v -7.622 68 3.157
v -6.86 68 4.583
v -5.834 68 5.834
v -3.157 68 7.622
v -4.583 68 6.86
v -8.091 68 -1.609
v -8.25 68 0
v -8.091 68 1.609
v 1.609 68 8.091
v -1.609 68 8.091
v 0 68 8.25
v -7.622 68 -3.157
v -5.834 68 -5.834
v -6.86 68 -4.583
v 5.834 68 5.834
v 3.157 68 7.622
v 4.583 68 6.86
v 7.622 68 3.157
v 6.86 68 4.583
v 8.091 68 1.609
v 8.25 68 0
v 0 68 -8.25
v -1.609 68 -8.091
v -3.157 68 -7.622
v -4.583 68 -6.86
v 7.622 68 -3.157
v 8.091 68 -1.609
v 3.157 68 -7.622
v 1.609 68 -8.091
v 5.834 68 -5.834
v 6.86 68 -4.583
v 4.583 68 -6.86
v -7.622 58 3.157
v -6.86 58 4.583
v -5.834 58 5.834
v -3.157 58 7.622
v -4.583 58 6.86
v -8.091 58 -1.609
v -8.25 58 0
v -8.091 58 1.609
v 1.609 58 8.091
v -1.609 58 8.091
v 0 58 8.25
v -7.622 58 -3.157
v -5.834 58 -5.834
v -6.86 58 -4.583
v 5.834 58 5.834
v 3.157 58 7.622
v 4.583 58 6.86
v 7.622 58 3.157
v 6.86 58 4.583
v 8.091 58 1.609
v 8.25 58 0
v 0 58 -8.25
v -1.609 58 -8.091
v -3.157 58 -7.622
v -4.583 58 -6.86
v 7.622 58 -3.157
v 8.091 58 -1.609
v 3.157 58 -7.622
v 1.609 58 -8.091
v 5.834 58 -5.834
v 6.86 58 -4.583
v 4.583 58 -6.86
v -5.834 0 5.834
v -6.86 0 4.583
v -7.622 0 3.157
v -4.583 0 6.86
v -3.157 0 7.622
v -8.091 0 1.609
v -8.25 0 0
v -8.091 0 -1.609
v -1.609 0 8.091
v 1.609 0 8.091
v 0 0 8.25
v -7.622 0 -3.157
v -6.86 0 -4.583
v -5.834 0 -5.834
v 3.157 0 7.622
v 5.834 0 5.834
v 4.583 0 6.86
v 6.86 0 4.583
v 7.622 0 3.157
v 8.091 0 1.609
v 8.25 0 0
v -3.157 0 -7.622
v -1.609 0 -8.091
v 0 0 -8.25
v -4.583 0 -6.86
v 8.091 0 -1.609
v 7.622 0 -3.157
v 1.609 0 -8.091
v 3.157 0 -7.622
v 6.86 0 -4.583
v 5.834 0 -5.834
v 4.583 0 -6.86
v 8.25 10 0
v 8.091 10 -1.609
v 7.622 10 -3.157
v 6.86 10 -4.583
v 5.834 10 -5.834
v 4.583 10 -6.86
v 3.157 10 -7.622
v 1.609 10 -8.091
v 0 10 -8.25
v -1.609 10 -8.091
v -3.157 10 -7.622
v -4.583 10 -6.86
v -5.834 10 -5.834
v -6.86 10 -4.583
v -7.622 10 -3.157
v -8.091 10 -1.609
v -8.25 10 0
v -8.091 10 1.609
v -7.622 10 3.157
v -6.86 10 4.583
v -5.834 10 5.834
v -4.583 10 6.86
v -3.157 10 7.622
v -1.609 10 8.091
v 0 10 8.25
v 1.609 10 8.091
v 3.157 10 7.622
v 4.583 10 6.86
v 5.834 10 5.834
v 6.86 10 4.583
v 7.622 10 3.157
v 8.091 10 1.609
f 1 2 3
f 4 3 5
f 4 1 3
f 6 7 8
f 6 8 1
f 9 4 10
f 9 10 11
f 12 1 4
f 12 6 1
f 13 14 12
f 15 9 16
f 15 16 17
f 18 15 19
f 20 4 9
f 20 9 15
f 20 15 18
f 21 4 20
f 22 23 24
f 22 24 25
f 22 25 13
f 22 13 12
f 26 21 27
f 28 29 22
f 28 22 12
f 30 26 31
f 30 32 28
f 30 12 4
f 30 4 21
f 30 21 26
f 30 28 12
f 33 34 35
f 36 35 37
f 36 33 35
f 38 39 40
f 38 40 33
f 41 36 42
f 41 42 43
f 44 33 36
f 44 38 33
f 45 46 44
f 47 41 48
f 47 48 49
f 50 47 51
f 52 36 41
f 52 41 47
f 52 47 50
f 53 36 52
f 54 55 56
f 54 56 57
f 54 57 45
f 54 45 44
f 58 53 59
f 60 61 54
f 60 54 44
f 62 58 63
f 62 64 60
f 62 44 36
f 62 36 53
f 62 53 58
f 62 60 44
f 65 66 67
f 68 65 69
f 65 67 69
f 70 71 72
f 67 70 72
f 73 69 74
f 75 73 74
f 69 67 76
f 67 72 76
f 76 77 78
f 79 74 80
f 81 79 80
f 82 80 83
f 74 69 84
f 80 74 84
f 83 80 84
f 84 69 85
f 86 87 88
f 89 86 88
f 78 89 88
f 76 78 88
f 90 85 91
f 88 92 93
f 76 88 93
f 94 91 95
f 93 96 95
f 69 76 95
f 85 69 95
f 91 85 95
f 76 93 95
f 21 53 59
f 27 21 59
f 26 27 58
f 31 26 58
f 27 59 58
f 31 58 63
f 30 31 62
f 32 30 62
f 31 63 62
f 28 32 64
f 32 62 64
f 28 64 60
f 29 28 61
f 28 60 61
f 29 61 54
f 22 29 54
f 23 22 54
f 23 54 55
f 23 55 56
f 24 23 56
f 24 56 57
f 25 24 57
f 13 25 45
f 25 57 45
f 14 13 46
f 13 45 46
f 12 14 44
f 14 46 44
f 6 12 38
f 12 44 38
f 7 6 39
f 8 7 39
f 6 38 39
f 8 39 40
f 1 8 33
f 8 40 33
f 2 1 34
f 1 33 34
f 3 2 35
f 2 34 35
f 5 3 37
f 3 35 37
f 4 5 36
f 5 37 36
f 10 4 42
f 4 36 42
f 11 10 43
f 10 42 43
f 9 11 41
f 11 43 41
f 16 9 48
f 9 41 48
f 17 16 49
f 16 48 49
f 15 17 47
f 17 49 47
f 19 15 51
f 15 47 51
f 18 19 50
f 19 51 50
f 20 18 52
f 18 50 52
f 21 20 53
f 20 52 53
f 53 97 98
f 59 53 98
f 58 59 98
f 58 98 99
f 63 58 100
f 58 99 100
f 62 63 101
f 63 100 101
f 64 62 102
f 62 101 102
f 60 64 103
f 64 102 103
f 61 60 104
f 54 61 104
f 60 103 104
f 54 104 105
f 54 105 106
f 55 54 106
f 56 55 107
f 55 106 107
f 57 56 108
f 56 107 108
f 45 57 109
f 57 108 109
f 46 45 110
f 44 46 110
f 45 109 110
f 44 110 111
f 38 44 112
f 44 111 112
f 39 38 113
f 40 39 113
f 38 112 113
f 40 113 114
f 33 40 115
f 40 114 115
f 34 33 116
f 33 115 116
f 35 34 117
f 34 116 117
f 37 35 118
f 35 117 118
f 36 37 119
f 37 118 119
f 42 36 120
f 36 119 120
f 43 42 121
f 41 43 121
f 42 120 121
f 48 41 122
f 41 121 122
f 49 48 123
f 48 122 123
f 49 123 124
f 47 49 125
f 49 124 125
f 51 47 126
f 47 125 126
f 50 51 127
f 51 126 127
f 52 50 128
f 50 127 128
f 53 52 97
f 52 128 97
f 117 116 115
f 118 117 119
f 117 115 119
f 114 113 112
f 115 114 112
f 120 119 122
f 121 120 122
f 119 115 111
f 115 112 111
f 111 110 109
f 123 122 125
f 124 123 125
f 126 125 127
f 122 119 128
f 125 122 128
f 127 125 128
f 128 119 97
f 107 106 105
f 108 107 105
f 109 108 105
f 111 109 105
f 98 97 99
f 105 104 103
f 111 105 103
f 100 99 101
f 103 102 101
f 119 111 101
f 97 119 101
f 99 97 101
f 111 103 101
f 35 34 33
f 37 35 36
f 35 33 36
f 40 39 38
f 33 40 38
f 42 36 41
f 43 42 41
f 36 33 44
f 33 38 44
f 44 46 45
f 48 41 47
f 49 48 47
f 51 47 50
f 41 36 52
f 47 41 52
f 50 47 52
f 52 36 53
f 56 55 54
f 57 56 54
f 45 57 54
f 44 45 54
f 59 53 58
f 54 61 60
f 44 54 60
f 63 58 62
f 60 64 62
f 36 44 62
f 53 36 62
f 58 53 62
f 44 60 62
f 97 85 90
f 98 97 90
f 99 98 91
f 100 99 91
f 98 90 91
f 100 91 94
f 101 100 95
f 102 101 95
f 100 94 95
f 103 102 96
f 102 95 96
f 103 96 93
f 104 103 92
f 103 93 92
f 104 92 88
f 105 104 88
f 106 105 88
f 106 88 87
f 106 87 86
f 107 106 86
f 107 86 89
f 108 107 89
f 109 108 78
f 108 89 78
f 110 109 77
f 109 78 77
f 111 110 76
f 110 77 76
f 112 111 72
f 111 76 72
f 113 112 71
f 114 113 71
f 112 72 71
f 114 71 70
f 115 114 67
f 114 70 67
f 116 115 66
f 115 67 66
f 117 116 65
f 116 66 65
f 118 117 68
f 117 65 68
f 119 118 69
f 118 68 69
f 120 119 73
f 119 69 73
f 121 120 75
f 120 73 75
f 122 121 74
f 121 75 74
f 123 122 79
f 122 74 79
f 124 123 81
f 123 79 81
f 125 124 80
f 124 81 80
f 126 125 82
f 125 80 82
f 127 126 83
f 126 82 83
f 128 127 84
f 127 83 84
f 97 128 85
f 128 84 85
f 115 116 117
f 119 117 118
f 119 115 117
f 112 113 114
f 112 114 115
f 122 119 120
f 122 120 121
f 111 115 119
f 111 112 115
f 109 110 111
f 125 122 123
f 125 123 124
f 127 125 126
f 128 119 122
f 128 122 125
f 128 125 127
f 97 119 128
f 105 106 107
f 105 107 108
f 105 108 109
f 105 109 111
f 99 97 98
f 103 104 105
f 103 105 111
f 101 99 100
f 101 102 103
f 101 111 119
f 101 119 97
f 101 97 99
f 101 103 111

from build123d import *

# Parameters (mm, degrees)
SKETCH1_R           = 8.25
BOSS_EXTRUDE1_DEPTH = 10
SKETCH2_R           = 8.25
BOSS_EXTRUDE2_DEPTH = 48
SKETCH3_R           = 8.25
BOSS_EXTRUDE3_DEPTH = 10


with BuildPart() as part:
    # Sketch1 → Boss-Extrude1 (new body)
    with BuildSketch(Plane(origin=(0, 0, 0), x_dir=(1, 0, 0), z_dir=(0, 1, 0))):
        Circle(SKETCH1_R)
    extrude(amount=BOSS_EXTRUDE1_DEPTH)


with BuildPart() as body_2:
    # Sketch2 → Boss-Extrude2 (new body)
    with BuildSketch(Plane(origin=(0, 10, 0), x_dir=(1, 0, 0), z_dir=(0, 1, 0))):
        Circle(SKETCH2_R)
    extrude(amount=BOSS_EXTRUDE2_DEPTH)


with BuildPart() as body_3:
    # Sketch3 → Boss-Extrude3 (new body)
    with BuildSketch(Plane(origin=(0, 58, 0), x_dir=(1, 0, 0), z_dir=(0, 1, 0))):
        Circle(SKETCH3_R)
    extrude(amount=BOSS_EXTRUDE3_DEPTH)


solid = Compound([part.part, body_2.part, body_3.part])
